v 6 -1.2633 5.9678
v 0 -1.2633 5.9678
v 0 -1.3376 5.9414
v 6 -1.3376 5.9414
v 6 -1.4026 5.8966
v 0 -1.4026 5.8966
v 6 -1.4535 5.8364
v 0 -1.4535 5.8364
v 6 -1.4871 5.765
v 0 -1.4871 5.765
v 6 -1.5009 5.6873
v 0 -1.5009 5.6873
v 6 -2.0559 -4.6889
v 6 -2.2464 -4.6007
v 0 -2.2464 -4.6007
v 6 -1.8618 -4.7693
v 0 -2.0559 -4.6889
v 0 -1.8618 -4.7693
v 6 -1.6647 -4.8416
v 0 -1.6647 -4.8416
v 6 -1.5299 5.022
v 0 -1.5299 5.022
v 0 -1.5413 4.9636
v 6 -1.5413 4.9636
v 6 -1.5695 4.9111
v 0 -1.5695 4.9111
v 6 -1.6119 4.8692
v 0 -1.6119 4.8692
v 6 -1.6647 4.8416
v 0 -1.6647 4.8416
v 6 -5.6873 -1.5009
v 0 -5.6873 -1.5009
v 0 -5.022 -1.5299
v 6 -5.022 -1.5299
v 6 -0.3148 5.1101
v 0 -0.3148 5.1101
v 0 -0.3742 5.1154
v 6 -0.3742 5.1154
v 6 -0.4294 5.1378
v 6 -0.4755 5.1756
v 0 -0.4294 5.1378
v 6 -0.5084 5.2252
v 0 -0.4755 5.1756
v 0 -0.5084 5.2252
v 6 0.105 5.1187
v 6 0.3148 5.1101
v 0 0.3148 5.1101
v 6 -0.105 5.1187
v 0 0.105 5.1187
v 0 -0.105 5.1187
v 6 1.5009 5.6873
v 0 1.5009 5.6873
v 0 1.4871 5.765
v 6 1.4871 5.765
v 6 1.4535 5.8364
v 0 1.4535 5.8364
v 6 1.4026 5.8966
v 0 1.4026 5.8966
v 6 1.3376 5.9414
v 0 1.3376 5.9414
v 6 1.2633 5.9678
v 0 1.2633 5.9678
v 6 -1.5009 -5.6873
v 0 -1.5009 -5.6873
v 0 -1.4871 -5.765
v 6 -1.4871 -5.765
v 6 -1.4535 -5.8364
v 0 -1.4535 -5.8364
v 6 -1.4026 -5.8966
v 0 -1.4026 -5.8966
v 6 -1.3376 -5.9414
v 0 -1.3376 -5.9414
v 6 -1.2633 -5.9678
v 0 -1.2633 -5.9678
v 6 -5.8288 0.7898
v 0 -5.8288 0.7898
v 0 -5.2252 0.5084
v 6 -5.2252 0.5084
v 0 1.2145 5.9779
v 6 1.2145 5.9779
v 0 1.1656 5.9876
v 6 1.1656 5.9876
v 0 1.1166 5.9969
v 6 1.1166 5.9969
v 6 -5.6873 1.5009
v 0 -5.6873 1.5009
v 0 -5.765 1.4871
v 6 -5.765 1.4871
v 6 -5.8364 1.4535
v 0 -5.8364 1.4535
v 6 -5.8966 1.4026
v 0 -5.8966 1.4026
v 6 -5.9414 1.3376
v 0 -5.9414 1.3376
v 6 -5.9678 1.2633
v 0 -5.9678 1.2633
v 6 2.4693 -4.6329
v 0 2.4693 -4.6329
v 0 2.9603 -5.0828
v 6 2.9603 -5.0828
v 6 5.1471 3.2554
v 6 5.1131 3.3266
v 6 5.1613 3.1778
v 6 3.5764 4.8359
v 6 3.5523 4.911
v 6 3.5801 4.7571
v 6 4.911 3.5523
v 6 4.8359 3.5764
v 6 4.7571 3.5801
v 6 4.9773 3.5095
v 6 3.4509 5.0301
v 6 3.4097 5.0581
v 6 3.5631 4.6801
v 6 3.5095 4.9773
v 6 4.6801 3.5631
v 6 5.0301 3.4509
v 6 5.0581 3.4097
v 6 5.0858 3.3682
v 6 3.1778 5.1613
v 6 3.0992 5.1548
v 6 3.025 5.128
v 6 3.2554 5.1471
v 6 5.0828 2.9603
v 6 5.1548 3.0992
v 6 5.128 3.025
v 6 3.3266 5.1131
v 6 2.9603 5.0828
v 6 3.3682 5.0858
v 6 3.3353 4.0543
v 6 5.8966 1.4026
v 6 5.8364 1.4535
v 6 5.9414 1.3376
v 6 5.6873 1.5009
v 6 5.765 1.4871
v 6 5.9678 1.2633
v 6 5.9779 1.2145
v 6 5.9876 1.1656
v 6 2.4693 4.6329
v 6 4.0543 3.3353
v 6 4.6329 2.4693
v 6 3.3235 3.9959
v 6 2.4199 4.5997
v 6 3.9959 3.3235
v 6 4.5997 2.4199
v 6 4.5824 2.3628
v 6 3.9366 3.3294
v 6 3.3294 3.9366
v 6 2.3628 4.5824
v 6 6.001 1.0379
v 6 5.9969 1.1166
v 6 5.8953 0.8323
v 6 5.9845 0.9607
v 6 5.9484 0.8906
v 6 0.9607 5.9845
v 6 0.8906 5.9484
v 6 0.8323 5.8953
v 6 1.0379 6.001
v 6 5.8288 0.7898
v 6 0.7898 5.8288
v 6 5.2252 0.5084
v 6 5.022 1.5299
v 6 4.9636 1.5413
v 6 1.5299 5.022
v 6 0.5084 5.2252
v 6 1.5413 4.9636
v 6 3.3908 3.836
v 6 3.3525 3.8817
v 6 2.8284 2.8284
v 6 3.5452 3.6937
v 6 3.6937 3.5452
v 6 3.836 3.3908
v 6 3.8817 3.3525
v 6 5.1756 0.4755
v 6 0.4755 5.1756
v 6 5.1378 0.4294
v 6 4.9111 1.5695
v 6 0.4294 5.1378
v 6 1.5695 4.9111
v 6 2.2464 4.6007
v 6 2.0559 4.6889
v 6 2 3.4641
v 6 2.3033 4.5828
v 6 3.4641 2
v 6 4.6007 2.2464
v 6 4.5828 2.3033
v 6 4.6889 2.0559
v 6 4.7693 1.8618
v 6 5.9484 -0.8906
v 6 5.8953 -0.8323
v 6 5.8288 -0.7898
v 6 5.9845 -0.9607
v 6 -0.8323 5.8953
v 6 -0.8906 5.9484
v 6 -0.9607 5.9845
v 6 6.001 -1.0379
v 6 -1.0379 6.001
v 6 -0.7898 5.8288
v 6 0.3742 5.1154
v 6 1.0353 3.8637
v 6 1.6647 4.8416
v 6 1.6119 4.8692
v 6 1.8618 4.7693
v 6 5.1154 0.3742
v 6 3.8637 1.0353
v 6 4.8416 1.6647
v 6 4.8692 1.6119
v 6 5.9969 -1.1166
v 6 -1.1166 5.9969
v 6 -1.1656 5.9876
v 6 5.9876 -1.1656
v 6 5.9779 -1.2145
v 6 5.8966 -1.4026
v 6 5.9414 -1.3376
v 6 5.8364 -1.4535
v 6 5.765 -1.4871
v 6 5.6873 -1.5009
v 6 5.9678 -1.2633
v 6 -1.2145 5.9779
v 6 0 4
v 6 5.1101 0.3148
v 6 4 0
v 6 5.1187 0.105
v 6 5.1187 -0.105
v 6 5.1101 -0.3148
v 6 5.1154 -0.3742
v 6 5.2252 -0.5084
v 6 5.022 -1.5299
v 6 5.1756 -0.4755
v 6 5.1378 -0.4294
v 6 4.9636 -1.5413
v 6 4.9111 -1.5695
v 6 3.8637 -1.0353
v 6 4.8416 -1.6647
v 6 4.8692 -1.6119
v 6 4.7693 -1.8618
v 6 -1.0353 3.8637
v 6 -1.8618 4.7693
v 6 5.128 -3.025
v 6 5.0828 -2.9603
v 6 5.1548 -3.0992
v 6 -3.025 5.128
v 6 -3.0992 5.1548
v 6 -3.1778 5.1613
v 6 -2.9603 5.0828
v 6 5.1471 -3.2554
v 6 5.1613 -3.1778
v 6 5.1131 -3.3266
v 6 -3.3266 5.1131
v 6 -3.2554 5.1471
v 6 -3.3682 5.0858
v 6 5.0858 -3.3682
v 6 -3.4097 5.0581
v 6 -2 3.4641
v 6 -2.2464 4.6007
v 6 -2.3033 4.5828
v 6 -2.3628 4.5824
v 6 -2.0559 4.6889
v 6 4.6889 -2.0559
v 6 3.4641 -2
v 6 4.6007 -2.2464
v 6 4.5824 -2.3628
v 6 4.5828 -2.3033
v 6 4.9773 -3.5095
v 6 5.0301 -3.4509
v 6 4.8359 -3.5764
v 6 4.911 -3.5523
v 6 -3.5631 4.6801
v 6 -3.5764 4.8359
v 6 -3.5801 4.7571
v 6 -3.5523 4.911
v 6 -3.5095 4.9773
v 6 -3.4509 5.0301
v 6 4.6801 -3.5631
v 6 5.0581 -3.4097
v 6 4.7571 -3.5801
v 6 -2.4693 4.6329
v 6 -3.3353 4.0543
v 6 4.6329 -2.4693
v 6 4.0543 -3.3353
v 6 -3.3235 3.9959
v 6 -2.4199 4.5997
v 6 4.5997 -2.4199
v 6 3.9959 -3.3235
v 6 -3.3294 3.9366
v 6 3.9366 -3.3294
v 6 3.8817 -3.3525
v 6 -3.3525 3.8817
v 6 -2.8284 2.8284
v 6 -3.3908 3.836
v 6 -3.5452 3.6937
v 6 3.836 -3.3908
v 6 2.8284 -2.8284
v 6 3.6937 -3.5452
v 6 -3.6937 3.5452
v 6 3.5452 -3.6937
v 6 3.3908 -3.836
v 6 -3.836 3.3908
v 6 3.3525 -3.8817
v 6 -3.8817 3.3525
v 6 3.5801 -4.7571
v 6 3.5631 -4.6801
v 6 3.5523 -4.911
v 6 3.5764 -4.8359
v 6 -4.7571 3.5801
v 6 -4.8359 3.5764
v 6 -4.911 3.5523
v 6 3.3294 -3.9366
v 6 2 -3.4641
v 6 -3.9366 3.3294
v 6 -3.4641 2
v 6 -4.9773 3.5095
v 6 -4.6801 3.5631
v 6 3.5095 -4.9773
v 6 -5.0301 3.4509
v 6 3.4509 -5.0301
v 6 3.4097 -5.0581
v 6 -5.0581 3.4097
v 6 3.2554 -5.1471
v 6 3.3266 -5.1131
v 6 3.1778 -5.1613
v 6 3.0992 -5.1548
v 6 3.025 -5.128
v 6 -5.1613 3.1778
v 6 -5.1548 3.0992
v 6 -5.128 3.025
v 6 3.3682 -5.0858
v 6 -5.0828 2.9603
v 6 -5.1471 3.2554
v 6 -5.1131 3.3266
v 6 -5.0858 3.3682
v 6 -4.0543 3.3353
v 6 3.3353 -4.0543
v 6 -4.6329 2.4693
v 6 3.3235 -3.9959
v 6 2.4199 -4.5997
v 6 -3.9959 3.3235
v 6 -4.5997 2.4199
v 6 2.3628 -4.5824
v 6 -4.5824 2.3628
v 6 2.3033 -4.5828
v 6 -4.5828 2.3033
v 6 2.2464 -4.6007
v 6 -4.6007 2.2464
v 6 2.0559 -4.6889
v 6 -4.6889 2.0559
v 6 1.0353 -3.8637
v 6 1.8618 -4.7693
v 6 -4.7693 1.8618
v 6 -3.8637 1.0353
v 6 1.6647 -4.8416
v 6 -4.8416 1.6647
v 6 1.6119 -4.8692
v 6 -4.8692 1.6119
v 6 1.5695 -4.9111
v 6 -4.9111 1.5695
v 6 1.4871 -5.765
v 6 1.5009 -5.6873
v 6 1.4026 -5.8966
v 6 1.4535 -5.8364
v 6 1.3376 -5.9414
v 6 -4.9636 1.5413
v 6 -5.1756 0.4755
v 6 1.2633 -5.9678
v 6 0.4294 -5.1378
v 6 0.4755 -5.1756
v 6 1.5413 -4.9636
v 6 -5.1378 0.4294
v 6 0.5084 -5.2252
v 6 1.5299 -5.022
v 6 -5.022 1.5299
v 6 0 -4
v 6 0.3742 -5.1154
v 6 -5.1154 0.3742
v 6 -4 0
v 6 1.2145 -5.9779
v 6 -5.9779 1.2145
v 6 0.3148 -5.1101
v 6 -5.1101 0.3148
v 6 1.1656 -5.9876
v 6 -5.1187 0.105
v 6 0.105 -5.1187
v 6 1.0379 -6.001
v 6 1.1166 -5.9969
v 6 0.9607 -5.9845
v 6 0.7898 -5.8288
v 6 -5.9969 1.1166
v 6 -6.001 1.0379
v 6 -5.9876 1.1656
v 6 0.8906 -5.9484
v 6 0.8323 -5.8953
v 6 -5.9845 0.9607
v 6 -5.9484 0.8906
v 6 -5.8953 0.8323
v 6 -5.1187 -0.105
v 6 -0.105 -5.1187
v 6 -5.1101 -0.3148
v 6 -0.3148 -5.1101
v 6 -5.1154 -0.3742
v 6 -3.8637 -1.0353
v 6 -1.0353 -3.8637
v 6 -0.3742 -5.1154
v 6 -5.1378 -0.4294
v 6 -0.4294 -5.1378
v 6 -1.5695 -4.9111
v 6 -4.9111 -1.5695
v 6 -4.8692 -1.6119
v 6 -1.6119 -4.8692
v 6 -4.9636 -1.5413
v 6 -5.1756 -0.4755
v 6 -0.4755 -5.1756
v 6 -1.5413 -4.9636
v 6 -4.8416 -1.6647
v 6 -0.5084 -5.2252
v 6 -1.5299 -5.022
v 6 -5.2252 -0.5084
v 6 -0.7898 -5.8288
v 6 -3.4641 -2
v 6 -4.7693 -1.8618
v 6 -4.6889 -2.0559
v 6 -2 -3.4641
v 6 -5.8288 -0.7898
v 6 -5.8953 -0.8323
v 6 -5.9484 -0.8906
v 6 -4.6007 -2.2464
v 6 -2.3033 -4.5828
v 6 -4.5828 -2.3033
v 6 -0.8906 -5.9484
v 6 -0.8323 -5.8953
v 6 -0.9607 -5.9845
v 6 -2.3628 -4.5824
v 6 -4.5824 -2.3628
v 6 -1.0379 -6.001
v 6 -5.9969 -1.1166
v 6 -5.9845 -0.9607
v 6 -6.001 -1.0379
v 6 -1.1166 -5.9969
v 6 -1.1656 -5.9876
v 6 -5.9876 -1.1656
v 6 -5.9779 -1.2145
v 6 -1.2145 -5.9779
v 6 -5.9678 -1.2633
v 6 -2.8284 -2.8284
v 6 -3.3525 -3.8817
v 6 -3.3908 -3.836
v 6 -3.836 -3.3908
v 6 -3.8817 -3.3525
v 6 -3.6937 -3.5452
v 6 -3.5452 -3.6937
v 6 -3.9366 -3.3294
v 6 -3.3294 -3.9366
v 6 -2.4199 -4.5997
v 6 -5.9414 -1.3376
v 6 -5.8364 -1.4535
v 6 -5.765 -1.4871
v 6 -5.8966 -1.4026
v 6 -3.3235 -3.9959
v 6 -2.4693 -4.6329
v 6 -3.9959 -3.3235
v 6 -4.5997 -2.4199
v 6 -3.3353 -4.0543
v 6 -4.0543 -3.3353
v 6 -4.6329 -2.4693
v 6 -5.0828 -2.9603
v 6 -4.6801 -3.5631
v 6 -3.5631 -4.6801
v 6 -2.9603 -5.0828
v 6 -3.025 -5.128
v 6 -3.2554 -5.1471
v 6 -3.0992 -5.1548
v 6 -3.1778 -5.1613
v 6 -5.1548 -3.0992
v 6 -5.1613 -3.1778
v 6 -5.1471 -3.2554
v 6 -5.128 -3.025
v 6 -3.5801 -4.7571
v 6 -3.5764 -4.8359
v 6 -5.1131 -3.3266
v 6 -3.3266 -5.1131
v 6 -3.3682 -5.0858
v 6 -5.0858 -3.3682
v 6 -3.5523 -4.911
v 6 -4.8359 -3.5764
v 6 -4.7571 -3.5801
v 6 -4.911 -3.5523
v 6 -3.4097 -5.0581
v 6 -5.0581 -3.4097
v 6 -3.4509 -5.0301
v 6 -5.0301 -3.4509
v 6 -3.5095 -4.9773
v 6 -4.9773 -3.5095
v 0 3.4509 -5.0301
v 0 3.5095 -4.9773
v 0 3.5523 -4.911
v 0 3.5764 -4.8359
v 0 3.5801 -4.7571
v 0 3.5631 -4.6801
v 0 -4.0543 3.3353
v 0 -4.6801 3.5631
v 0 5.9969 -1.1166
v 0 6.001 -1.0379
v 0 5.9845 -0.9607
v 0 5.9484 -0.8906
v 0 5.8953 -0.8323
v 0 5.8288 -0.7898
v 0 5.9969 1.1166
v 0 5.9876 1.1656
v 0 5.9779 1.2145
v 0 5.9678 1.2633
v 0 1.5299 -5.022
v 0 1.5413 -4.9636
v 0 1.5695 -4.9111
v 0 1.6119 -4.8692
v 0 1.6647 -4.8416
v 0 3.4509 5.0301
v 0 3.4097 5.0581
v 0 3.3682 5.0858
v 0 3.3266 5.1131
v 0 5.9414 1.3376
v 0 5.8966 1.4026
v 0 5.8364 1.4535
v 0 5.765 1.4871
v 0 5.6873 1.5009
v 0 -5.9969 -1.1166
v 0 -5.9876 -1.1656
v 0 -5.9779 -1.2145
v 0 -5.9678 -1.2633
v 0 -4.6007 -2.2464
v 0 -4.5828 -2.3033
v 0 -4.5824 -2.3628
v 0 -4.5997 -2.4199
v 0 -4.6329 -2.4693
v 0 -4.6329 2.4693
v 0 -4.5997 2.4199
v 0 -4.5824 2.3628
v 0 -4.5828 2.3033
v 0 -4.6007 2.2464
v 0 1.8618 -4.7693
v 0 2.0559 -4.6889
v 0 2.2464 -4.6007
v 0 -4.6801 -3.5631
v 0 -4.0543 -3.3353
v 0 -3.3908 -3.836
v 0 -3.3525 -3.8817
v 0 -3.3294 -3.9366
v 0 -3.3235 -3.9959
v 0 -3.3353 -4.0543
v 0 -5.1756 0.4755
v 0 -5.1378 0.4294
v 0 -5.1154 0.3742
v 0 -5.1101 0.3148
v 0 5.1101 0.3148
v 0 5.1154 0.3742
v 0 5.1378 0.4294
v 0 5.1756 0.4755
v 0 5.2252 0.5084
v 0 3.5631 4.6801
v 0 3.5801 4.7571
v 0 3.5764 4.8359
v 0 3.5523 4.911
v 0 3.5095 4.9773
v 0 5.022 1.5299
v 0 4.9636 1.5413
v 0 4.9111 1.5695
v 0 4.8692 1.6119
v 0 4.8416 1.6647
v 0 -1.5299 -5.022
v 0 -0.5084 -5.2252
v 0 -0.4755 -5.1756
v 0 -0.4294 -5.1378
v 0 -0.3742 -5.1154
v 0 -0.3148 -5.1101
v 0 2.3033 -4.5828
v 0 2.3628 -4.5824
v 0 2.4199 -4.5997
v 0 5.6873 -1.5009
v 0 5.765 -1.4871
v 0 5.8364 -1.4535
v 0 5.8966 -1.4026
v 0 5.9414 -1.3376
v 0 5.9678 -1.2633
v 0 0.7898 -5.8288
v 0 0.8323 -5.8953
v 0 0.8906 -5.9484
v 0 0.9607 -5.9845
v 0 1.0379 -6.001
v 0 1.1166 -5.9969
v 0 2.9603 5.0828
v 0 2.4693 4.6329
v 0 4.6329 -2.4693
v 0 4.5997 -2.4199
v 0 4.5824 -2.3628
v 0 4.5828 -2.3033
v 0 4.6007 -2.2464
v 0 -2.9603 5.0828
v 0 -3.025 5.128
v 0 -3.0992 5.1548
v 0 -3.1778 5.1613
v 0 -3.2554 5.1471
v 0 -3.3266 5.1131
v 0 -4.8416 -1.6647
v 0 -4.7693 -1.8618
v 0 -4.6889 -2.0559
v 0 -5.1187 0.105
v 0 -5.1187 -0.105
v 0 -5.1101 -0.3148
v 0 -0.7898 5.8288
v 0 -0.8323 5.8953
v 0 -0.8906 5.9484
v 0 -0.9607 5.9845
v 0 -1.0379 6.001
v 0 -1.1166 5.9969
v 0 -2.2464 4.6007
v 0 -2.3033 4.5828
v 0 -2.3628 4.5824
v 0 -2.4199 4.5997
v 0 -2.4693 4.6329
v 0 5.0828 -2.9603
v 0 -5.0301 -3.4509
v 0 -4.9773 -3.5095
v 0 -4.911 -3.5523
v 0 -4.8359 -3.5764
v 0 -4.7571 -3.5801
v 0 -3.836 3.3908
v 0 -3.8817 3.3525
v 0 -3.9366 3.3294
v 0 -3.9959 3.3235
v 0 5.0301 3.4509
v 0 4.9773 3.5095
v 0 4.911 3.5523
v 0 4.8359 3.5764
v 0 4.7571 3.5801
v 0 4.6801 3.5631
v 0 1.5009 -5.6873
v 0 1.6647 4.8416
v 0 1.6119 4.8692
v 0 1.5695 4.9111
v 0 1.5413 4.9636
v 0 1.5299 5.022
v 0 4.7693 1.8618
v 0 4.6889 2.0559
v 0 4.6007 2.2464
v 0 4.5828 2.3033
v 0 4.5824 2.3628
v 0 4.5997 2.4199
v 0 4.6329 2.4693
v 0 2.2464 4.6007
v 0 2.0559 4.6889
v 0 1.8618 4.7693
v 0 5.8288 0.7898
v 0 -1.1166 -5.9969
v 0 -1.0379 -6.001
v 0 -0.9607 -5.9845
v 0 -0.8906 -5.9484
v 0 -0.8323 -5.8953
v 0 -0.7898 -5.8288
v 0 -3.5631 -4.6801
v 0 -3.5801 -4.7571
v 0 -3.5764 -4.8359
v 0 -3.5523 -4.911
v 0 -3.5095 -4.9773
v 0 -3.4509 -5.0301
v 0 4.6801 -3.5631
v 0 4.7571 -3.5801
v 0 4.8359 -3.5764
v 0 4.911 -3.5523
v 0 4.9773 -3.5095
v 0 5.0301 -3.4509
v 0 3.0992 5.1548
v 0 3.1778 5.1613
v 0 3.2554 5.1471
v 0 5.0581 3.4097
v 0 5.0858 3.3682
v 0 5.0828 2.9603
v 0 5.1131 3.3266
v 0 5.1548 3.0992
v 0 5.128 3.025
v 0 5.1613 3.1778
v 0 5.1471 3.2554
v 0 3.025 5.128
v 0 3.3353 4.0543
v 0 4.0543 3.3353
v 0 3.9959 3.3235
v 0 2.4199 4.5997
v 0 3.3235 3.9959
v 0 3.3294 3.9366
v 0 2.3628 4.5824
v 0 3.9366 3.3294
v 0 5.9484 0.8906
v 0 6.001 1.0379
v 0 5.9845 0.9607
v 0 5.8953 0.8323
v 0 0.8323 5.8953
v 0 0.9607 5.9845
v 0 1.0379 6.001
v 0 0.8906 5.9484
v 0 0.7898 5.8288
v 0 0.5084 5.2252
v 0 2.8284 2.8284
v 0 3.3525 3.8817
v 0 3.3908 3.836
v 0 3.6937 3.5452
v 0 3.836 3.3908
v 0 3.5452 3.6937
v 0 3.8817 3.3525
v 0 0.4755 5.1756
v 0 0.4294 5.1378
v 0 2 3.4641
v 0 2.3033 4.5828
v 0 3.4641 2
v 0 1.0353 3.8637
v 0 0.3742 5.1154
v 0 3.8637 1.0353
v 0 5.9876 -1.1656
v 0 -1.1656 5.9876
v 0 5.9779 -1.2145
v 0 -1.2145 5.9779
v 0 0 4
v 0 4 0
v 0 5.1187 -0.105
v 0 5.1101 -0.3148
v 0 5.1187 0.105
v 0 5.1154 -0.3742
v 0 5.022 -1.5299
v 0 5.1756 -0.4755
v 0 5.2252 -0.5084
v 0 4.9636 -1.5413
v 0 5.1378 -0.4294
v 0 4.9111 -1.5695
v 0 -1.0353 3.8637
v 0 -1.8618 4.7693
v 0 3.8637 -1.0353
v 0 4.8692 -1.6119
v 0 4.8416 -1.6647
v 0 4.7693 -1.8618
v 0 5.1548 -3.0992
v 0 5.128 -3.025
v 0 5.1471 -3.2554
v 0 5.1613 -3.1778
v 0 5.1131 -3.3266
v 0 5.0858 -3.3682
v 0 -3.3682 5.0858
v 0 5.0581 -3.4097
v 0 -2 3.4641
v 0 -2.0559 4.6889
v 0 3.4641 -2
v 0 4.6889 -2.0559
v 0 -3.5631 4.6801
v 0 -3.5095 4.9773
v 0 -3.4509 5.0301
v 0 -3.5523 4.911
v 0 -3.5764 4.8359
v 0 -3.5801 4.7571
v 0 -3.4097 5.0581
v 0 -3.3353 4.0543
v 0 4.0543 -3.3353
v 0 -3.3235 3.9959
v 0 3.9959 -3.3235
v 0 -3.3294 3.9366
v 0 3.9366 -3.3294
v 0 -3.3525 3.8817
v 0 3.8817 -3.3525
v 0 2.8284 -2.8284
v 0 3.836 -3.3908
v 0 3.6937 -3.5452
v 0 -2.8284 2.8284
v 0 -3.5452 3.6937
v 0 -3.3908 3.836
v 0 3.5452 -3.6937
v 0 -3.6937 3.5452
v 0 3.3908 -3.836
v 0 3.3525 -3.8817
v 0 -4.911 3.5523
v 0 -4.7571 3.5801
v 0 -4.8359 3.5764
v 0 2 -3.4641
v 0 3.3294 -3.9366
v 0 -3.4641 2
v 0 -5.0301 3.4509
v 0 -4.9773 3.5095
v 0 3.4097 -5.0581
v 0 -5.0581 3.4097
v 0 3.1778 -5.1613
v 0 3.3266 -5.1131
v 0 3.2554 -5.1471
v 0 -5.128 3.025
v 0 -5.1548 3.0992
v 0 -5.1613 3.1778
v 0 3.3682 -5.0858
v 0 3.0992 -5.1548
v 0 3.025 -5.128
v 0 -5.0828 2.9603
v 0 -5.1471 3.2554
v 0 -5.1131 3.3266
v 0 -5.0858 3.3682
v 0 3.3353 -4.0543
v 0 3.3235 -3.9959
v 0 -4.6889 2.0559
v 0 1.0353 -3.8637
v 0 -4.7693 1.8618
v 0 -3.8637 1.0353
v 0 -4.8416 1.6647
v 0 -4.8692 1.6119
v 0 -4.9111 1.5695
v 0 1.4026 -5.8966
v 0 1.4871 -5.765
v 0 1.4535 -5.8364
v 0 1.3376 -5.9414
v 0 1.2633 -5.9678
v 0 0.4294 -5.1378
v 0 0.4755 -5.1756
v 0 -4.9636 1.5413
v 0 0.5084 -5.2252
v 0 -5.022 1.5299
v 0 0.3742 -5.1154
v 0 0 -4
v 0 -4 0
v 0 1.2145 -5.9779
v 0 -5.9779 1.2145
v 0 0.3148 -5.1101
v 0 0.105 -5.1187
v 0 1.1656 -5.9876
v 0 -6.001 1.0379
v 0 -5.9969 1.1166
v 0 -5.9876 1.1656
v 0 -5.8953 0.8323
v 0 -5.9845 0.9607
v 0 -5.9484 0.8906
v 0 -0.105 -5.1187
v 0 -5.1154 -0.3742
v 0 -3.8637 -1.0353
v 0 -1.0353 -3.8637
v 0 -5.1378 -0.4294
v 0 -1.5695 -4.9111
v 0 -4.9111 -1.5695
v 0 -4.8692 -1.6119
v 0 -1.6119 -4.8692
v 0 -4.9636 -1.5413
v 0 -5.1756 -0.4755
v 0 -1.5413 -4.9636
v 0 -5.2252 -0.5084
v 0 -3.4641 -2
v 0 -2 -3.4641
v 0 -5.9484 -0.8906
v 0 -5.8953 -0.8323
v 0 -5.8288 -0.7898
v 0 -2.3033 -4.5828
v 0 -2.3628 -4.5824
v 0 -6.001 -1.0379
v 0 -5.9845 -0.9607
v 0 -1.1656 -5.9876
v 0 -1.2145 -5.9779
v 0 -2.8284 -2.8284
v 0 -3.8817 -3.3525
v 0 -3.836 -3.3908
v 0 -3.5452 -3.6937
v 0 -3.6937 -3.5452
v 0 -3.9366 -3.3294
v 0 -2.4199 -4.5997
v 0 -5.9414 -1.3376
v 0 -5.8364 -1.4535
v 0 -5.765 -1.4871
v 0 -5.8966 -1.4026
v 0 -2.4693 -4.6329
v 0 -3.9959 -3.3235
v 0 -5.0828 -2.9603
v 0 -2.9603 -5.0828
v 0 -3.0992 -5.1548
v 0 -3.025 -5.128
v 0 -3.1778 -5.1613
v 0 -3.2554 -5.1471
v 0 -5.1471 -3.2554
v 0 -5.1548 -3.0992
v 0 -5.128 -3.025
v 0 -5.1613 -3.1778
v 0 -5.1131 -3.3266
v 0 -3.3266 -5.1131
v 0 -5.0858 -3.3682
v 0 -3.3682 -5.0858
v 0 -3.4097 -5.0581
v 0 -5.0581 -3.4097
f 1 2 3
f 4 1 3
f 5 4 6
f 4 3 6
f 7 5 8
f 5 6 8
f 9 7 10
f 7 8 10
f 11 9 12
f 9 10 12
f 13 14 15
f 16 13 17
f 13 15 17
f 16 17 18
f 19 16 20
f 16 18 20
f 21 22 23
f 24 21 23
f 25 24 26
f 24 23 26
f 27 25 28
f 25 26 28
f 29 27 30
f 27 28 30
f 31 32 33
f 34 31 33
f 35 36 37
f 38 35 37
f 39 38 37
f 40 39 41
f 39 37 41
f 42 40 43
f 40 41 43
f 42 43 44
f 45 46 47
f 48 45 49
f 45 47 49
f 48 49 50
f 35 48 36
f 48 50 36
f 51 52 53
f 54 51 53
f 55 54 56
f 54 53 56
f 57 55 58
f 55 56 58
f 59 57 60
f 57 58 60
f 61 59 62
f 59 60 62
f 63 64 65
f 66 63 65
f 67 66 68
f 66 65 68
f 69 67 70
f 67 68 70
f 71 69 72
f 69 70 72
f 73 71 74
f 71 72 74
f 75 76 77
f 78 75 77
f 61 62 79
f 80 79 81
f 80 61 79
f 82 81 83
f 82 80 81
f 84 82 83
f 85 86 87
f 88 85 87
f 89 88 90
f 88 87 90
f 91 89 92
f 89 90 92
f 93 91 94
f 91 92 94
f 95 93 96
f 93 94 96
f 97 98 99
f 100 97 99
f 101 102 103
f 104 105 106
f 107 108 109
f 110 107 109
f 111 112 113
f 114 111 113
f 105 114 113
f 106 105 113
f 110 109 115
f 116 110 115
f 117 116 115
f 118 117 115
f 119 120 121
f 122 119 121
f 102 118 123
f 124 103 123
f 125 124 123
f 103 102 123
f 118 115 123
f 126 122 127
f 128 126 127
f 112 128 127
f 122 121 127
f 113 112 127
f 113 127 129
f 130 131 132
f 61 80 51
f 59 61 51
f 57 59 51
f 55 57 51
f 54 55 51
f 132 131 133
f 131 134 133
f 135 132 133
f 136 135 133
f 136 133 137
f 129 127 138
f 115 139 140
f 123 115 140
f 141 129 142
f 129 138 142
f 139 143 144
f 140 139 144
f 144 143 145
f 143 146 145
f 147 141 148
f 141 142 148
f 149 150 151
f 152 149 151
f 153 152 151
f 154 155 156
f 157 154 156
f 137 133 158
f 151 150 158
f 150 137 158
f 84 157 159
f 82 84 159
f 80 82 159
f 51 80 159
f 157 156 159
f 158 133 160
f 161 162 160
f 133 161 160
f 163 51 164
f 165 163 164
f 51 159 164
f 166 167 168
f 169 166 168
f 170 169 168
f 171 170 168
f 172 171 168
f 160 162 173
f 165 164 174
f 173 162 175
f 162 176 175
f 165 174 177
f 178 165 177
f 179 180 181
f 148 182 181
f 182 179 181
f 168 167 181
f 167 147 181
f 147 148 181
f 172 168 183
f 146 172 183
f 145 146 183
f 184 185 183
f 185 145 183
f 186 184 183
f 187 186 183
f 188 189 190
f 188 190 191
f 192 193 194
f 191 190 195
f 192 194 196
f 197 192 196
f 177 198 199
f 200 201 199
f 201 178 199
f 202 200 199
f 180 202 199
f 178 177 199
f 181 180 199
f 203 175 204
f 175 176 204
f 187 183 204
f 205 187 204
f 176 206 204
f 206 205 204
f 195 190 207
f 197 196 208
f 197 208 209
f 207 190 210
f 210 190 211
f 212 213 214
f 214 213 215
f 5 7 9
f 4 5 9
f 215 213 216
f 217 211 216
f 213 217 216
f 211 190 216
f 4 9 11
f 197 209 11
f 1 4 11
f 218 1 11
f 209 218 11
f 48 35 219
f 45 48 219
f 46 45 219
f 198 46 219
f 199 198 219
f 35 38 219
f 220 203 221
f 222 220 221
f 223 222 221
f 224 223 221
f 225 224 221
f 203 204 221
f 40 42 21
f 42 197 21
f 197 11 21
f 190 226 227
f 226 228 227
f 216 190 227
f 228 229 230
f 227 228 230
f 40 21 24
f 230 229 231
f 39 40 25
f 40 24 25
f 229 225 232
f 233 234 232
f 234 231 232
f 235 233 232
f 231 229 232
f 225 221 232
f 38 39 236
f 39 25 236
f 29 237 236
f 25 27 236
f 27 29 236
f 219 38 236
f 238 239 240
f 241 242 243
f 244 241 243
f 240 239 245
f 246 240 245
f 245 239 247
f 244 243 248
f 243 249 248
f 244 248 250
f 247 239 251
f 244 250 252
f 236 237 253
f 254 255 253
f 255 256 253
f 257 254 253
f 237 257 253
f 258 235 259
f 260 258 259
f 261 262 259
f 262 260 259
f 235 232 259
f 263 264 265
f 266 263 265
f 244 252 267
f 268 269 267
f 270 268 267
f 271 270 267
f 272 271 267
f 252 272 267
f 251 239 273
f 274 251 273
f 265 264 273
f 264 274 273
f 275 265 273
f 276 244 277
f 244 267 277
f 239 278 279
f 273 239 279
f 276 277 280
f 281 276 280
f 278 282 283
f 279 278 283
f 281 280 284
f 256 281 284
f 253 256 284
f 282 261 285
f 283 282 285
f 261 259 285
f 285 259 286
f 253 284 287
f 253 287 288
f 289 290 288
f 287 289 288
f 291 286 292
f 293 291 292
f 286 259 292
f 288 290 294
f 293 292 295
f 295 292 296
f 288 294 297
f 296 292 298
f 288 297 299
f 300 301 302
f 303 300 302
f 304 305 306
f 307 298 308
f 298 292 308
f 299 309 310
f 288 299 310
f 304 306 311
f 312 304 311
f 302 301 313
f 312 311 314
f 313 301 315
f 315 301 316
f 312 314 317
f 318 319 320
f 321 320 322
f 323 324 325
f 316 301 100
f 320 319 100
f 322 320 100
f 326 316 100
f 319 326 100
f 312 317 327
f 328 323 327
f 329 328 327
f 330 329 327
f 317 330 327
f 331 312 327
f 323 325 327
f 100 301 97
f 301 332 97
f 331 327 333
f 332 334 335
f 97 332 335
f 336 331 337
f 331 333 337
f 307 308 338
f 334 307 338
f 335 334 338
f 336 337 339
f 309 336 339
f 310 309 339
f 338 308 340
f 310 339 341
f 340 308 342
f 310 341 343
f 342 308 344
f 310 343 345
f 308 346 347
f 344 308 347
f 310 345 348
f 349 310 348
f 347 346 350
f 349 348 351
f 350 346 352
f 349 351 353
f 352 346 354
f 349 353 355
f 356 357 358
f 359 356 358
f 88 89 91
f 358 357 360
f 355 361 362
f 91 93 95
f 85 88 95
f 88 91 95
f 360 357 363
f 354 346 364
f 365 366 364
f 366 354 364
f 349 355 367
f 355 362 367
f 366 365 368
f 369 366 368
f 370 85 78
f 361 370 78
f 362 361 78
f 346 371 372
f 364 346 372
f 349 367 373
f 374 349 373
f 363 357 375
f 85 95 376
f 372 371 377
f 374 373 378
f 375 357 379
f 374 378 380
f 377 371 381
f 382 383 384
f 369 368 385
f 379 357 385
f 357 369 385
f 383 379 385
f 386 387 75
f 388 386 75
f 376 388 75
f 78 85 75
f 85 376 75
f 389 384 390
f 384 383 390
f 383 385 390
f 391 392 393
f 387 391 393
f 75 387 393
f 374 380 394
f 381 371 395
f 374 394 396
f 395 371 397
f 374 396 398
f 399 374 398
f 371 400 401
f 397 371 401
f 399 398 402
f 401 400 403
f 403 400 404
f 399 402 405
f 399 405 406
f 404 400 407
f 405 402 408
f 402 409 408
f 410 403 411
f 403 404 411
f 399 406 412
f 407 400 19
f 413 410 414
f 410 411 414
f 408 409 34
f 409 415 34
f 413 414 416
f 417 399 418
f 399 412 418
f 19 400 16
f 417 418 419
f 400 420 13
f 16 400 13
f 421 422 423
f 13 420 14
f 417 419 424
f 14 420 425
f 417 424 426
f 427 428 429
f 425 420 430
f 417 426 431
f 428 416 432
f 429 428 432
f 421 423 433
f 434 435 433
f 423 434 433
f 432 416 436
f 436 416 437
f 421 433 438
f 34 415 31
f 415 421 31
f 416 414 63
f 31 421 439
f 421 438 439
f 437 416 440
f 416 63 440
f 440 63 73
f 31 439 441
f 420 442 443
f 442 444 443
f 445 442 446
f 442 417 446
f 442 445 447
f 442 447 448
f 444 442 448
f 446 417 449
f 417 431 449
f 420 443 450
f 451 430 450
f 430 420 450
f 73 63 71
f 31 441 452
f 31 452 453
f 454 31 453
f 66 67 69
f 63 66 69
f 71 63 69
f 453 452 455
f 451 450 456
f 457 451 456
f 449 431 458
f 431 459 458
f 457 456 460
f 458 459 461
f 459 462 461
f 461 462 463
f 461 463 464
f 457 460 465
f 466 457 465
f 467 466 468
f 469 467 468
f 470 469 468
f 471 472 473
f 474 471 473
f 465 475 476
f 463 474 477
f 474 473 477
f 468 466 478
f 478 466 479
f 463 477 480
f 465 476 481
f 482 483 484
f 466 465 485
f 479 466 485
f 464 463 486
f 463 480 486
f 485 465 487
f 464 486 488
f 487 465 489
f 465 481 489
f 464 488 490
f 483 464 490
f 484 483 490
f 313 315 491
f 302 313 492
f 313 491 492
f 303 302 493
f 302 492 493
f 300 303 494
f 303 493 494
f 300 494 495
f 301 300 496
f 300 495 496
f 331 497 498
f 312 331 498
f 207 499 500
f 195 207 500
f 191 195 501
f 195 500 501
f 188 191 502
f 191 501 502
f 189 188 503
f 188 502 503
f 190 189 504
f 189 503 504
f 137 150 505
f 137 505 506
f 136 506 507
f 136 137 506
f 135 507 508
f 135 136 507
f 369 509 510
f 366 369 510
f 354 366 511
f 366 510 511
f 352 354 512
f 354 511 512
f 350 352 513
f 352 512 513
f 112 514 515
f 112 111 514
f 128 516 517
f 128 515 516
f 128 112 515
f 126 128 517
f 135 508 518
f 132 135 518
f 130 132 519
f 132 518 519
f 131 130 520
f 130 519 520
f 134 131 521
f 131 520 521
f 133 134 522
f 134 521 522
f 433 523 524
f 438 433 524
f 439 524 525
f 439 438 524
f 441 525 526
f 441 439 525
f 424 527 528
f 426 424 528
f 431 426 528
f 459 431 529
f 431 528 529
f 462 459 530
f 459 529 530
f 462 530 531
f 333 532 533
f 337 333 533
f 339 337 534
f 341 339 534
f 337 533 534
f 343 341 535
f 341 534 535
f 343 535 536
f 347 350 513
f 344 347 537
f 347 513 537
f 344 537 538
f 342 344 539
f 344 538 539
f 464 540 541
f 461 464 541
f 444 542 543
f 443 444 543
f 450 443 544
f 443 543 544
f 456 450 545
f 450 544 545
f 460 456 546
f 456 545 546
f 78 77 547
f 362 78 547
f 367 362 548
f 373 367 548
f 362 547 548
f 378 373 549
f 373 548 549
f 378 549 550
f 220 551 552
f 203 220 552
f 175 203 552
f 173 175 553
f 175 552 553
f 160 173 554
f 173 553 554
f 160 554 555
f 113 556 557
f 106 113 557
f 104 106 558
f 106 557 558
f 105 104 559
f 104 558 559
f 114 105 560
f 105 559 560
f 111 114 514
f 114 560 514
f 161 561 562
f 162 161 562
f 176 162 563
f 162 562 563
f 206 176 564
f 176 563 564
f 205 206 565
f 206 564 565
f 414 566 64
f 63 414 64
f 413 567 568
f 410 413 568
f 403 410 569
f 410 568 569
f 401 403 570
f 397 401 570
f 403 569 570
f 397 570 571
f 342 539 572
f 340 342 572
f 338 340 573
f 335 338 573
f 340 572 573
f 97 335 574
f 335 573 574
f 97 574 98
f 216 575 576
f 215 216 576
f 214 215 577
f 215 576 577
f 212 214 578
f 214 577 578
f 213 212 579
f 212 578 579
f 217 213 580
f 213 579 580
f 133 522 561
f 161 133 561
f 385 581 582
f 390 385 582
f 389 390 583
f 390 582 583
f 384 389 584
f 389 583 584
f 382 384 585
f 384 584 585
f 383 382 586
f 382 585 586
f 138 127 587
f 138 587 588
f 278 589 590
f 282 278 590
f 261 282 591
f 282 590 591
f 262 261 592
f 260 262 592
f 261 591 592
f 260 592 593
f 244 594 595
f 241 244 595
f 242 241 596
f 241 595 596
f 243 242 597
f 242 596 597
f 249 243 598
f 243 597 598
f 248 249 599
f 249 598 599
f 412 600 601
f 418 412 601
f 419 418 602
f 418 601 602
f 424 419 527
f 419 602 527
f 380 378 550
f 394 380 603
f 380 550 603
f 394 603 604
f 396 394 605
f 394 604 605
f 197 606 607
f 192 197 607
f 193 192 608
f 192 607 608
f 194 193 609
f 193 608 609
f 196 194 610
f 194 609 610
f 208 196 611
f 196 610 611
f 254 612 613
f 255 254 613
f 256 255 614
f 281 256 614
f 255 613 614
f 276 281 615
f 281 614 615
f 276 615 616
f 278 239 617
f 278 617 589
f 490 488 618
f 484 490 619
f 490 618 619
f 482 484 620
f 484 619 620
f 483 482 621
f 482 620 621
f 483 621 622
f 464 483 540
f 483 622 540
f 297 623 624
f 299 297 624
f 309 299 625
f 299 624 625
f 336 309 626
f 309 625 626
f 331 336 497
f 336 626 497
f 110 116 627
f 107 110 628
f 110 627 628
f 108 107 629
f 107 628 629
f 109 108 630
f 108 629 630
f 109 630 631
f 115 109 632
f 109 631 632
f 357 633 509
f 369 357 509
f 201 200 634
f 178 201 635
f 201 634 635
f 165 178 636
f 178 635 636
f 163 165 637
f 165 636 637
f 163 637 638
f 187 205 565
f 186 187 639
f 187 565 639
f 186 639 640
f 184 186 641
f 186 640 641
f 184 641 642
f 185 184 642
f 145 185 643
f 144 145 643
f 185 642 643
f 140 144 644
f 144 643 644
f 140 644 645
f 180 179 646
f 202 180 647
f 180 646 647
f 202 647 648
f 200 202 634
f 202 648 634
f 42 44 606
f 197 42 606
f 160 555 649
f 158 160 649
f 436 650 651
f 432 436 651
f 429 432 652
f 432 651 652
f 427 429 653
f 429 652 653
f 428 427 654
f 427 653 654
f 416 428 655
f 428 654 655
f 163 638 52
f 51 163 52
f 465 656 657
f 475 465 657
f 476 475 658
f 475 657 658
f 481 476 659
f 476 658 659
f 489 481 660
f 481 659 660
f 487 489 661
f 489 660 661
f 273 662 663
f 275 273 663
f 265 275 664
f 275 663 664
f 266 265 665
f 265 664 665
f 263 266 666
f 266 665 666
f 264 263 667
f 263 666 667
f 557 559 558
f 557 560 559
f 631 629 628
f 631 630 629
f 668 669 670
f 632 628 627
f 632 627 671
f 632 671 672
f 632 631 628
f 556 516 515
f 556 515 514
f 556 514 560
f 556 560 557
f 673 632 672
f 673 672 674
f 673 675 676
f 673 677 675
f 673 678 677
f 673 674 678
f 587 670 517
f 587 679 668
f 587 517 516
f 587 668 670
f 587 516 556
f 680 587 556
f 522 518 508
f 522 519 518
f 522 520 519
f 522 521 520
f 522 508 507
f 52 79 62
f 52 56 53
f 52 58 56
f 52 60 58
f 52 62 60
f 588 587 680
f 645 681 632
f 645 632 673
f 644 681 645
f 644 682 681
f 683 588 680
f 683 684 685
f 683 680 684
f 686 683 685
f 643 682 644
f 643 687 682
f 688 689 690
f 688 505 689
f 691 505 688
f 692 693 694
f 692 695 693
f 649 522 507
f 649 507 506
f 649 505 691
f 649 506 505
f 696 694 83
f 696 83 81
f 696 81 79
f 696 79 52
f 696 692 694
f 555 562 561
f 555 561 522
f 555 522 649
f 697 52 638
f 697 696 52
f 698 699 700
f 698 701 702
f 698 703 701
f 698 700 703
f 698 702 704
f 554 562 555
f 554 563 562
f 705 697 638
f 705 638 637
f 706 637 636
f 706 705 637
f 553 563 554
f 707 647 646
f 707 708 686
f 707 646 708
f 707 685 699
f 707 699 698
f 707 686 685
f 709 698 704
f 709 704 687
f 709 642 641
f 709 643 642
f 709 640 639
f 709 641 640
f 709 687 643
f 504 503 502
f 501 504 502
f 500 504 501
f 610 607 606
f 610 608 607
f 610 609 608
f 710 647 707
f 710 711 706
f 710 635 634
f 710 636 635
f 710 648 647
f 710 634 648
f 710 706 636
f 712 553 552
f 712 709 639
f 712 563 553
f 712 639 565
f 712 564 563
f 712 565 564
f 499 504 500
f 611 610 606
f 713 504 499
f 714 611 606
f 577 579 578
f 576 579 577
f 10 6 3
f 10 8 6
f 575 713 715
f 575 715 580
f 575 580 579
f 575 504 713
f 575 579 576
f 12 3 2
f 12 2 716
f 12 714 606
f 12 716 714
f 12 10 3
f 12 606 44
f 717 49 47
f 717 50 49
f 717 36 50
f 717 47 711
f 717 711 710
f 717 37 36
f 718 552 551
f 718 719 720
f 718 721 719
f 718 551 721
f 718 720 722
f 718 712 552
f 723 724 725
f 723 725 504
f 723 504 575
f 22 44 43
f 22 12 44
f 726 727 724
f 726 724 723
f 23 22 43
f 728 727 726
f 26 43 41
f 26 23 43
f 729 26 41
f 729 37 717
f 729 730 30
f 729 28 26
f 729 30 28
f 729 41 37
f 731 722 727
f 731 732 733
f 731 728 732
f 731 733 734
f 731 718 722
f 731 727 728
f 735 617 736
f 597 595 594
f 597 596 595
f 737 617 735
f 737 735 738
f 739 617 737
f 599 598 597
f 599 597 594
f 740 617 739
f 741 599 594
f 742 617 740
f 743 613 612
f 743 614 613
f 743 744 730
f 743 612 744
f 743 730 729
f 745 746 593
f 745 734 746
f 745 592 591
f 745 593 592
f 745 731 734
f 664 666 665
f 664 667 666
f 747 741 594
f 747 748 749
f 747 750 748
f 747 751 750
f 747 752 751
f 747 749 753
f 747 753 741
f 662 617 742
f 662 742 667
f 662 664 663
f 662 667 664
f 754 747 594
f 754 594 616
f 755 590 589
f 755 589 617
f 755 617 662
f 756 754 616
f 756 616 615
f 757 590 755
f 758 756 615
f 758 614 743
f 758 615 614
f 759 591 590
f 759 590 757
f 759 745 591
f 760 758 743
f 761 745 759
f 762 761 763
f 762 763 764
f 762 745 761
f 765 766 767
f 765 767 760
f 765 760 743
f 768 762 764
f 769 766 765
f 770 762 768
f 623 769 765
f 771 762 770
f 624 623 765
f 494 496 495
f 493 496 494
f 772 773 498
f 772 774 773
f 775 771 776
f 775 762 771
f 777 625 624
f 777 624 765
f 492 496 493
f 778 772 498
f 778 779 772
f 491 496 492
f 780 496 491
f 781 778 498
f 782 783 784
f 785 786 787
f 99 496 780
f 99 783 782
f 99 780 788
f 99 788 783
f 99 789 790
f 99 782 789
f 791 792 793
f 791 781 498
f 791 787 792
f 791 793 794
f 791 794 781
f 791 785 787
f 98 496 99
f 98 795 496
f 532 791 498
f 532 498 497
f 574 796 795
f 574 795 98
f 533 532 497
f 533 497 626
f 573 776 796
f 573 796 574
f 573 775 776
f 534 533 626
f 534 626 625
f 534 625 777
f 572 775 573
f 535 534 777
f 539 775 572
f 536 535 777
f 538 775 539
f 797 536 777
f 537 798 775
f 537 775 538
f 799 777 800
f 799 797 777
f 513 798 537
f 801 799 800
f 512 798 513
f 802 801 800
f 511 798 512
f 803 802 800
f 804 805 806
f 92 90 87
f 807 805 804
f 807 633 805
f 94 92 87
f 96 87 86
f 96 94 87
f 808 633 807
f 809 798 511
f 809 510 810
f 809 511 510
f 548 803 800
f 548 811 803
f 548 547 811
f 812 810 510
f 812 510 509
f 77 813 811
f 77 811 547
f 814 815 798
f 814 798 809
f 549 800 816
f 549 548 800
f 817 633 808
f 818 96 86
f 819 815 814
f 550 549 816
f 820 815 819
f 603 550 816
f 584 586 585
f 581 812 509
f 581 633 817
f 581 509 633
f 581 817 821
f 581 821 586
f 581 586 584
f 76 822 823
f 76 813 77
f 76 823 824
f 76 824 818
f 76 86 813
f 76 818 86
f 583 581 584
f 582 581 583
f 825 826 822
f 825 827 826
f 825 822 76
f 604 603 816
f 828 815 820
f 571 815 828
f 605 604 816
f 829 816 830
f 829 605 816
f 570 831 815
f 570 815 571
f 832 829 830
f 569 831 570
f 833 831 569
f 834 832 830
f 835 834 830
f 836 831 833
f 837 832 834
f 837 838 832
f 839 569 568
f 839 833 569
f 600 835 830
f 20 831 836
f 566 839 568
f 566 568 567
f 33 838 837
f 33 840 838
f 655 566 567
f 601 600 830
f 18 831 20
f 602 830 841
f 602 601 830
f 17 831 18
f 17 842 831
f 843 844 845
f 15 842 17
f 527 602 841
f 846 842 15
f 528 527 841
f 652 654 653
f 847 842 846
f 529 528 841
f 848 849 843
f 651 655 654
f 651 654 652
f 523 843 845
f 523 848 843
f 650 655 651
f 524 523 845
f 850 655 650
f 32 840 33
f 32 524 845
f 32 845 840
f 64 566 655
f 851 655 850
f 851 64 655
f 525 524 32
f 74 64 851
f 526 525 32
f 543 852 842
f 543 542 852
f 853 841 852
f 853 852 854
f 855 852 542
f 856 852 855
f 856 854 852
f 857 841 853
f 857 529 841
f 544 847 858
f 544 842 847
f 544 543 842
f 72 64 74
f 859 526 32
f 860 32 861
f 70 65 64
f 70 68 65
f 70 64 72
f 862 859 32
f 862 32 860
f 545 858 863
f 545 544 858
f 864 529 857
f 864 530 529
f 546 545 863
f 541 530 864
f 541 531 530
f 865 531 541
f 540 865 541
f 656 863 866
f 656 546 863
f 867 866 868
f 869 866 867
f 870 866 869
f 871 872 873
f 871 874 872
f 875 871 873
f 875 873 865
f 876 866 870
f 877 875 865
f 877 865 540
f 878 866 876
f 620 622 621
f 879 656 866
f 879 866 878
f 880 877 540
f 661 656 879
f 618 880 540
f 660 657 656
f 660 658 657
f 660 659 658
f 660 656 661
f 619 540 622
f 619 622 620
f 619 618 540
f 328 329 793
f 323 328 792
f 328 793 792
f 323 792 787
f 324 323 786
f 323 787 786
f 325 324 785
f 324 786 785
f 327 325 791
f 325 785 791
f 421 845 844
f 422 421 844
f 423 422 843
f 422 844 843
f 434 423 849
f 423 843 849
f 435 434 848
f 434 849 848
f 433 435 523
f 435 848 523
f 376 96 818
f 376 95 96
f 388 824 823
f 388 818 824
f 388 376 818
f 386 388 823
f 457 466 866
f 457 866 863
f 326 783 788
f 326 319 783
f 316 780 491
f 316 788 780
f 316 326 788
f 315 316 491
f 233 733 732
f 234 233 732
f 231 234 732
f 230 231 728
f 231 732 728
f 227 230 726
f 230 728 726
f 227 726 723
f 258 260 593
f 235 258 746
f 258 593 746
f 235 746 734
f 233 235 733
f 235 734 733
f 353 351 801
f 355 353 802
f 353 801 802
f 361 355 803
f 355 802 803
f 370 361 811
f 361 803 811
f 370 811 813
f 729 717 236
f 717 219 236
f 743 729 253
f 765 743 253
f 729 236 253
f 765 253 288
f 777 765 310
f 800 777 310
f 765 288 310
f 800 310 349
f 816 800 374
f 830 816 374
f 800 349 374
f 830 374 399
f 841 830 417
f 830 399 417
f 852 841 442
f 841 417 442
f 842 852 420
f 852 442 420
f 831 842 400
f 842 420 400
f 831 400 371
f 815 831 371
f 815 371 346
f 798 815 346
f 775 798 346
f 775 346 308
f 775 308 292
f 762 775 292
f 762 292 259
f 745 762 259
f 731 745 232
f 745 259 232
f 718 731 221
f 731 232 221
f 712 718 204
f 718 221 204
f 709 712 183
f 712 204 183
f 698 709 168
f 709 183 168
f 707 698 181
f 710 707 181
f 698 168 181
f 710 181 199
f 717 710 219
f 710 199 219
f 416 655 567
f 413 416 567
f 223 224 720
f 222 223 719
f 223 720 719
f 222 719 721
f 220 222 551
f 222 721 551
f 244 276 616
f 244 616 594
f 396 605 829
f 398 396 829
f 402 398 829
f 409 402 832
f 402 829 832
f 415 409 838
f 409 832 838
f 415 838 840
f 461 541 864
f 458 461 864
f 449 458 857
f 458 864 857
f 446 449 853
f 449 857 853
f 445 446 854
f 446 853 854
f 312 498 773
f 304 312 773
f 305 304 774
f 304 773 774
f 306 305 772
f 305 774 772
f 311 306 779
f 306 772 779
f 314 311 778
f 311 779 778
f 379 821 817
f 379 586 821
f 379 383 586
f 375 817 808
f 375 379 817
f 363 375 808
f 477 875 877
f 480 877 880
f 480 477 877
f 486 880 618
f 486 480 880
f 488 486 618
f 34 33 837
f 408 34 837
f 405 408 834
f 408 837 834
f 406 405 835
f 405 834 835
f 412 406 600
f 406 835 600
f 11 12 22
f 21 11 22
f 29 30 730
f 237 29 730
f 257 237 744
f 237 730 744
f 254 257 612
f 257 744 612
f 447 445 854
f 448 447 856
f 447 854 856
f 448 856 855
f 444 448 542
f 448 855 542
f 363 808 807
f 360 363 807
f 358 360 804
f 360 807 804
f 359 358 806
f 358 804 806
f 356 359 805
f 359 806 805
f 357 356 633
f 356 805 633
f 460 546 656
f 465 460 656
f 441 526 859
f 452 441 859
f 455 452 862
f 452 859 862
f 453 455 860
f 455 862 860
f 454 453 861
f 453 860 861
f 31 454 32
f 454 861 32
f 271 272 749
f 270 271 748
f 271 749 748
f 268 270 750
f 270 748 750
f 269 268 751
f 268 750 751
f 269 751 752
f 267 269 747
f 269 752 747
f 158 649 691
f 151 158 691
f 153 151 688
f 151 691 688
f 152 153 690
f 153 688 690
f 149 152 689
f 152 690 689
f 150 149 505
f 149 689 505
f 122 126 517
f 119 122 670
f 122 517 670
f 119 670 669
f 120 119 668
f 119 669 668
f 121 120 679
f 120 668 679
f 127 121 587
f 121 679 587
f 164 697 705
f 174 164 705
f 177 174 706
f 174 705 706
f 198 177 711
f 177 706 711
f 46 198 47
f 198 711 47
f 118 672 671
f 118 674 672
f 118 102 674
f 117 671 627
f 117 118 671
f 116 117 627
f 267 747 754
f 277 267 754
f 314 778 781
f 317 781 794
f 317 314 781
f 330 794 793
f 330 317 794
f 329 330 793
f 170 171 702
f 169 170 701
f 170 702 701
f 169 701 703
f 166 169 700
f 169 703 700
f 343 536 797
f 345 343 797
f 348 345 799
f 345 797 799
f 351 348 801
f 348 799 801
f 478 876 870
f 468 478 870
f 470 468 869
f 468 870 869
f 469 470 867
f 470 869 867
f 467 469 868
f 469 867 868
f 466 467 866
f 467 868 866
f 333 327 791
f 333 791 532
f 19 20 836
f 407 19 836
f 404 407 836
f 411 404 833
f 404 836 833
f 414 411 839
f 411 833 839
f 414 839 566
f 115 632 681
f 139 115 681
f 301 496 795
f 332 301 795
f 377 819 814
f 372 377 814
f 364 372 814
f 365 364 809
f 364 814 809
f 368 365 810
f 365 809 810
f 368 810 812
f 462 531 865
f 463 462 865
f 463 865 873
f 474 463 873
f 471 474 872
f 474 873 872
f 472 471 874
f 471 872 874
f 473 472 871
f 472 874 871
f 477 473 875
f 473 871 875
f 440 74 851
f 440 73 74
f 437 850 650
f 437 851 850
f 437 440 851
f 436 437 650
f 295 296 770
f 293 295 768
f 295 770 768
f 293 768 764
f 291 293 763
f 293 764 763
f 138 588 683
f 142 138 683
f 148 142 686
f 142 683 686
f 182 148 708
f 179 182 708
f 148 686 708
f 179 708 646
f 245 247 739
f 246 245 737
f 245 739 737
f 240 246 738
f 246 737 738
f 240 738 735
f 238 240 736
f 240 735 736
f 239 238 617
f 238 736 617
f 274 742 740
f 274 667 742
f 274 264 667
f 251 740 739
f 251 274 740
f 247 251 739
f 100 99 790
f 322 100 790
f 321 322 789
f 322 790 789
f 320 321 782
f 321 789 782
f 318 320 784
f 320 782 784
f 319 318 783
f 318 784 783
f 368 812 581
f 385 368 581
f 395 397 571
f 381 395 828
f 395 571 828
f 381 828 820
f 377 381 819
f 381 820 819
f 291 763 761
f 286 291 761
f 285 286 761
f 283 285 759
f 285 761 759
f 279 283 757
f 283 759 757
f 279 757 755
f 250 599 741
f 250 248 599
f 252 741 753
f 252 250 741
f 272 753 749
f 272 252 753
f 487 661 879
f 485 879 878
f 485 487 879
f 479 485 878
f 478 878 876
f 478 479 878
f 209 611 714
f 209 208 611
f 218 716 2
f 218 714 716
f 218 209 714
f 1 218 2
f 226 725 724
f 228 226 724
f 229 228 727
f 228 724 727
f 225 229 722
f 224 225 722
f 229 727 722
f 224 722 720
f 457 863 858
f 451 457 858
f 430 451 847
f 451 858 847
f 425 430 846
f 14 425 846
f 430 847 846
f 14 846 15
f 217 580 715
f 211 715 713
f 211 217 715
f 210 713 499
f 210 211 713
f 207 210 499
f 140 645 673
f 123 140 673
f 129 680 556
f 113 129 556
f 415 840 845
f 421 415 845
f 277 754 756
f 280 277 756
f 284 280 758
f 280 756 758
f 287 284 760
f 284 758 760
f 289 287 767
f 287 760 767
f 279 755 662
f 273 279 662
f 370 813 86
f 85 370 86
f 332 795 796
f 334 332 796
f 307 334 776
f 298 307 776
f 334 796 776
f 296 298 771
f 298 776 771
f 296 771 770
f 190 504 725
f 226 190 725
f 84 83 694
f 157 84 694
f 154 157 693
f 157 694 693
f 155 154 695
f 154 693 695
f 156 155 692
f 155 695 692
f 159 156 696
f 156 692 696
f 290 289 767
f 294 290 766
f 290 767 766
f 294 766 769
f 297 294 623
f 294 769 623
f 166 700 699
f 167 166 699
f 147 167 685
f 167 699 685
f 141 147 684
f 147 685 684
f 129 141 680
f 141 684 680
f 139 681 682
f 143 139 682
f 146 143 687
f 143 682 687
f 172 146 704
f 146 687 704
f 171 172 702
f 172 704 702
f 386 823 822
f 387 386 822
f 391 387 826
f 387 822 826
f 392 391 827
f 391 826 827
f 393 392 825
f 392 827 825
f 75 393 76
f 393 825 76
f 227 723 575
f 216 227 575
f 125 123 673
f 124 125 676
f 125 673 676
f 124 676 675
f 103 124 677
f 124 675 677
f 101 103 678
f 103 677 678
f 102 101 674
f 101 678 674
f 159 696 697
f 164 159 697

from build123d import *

# Parameters (mm, degrees)
SKETCH2_W         = 6
SKETCH2_H         = 6.1
COG_DEPTH         = 11.50809212
PATTERN_COG_COUNT = 16
SKETCH8_W         = 17.303989153
SKETCH8_H         = 4


with BuildPart() as part:
    # Sketch2 → Body (revolve)
    with BuildSketch(Plane.XY, mode=Mode.PRIVATE) as body_sk:
        with Locations((3, 3.05)):
            Rectangle(SKETCH2_W, SKETCH2_H)
    revolve(body_sk.sketch.rotate(Axis((0, 0, 0), (1, 0, 0)), 90), axis=Axis((0, 0, 0), (1, 0, 0)))

    # Sketch6 → Cog (cut, through all)
    with BuildSketch(Plane(origin=(0, 0, 0), x_dir=(0, 0, -1), z_dir=(1, 0, 0))):
        with BuildLine():
            Line((0.789835397, 5.82877936), (0.508392514, 5.225223151))
            ThreePointArc((0.508392514, 5.225223151), (0.429351309, 5.137842761), (0.314832372, 5.1101253))
            ThreePointArc((0.314832372, 5.1101253), (0, 5.11981445), (-0.314832372, 5.1101253))
            ThreePointArc((-0.314832372, 5.1101253), (-0.429351309, 5.137842761), (-0.508392514, 5.225223151))
            Line((-0.508392514, 5.225223151), (-0.789835397, 5.82877936))
            ThreePointArc((-0.789835397, 5.82877936), (-0.924476923, 5.968756351), (-1.116644684, 5.996924599))
            ThreePointArc((-1.116644684, 5.996924599), (0, 6.1), (1.116644684, 5.996924599))
            ThreePointArc((1.116644684, 5.996924599), (0.924476923, 5.968756351), (0.789835397, 5.82877936))
        make_face()
    cog = extrude(amount=COG_DEPTH, mode=Mode.SUBTRACT)

    # Pattern-Cog: Cog ×16 about axis
    pattern_cog_axis = Axis((0, 0, 0), (1, 0, 0))
    for i in range(1, PATTERN_COG_COUNT):
        add(cog.rotate(pattern_cog_axis, i * 360 / PATTERN_COG_COUNT), mode=Mode.SUBTRACT)

    # Sketch8 → Hole-Shaft (revolve, cut)
    with BuildSketch(Plane.XY, mode=Mode.PRIVATE) as hole_shaft_sk:
        with Locations((7.348005424, -2)):
            Rectangle(SKETCH8_W, SKETCH8_H)
    revolve(hole_shaft_sk.sketch.rotate(Axis((-1.303989153, 0, 0), (1, 0, 0)), 270), axis=Axis((-1.303989153, 0, 0), (1, 0, 0)), mode=Mode.SUBTRACT)


solid = part.part
